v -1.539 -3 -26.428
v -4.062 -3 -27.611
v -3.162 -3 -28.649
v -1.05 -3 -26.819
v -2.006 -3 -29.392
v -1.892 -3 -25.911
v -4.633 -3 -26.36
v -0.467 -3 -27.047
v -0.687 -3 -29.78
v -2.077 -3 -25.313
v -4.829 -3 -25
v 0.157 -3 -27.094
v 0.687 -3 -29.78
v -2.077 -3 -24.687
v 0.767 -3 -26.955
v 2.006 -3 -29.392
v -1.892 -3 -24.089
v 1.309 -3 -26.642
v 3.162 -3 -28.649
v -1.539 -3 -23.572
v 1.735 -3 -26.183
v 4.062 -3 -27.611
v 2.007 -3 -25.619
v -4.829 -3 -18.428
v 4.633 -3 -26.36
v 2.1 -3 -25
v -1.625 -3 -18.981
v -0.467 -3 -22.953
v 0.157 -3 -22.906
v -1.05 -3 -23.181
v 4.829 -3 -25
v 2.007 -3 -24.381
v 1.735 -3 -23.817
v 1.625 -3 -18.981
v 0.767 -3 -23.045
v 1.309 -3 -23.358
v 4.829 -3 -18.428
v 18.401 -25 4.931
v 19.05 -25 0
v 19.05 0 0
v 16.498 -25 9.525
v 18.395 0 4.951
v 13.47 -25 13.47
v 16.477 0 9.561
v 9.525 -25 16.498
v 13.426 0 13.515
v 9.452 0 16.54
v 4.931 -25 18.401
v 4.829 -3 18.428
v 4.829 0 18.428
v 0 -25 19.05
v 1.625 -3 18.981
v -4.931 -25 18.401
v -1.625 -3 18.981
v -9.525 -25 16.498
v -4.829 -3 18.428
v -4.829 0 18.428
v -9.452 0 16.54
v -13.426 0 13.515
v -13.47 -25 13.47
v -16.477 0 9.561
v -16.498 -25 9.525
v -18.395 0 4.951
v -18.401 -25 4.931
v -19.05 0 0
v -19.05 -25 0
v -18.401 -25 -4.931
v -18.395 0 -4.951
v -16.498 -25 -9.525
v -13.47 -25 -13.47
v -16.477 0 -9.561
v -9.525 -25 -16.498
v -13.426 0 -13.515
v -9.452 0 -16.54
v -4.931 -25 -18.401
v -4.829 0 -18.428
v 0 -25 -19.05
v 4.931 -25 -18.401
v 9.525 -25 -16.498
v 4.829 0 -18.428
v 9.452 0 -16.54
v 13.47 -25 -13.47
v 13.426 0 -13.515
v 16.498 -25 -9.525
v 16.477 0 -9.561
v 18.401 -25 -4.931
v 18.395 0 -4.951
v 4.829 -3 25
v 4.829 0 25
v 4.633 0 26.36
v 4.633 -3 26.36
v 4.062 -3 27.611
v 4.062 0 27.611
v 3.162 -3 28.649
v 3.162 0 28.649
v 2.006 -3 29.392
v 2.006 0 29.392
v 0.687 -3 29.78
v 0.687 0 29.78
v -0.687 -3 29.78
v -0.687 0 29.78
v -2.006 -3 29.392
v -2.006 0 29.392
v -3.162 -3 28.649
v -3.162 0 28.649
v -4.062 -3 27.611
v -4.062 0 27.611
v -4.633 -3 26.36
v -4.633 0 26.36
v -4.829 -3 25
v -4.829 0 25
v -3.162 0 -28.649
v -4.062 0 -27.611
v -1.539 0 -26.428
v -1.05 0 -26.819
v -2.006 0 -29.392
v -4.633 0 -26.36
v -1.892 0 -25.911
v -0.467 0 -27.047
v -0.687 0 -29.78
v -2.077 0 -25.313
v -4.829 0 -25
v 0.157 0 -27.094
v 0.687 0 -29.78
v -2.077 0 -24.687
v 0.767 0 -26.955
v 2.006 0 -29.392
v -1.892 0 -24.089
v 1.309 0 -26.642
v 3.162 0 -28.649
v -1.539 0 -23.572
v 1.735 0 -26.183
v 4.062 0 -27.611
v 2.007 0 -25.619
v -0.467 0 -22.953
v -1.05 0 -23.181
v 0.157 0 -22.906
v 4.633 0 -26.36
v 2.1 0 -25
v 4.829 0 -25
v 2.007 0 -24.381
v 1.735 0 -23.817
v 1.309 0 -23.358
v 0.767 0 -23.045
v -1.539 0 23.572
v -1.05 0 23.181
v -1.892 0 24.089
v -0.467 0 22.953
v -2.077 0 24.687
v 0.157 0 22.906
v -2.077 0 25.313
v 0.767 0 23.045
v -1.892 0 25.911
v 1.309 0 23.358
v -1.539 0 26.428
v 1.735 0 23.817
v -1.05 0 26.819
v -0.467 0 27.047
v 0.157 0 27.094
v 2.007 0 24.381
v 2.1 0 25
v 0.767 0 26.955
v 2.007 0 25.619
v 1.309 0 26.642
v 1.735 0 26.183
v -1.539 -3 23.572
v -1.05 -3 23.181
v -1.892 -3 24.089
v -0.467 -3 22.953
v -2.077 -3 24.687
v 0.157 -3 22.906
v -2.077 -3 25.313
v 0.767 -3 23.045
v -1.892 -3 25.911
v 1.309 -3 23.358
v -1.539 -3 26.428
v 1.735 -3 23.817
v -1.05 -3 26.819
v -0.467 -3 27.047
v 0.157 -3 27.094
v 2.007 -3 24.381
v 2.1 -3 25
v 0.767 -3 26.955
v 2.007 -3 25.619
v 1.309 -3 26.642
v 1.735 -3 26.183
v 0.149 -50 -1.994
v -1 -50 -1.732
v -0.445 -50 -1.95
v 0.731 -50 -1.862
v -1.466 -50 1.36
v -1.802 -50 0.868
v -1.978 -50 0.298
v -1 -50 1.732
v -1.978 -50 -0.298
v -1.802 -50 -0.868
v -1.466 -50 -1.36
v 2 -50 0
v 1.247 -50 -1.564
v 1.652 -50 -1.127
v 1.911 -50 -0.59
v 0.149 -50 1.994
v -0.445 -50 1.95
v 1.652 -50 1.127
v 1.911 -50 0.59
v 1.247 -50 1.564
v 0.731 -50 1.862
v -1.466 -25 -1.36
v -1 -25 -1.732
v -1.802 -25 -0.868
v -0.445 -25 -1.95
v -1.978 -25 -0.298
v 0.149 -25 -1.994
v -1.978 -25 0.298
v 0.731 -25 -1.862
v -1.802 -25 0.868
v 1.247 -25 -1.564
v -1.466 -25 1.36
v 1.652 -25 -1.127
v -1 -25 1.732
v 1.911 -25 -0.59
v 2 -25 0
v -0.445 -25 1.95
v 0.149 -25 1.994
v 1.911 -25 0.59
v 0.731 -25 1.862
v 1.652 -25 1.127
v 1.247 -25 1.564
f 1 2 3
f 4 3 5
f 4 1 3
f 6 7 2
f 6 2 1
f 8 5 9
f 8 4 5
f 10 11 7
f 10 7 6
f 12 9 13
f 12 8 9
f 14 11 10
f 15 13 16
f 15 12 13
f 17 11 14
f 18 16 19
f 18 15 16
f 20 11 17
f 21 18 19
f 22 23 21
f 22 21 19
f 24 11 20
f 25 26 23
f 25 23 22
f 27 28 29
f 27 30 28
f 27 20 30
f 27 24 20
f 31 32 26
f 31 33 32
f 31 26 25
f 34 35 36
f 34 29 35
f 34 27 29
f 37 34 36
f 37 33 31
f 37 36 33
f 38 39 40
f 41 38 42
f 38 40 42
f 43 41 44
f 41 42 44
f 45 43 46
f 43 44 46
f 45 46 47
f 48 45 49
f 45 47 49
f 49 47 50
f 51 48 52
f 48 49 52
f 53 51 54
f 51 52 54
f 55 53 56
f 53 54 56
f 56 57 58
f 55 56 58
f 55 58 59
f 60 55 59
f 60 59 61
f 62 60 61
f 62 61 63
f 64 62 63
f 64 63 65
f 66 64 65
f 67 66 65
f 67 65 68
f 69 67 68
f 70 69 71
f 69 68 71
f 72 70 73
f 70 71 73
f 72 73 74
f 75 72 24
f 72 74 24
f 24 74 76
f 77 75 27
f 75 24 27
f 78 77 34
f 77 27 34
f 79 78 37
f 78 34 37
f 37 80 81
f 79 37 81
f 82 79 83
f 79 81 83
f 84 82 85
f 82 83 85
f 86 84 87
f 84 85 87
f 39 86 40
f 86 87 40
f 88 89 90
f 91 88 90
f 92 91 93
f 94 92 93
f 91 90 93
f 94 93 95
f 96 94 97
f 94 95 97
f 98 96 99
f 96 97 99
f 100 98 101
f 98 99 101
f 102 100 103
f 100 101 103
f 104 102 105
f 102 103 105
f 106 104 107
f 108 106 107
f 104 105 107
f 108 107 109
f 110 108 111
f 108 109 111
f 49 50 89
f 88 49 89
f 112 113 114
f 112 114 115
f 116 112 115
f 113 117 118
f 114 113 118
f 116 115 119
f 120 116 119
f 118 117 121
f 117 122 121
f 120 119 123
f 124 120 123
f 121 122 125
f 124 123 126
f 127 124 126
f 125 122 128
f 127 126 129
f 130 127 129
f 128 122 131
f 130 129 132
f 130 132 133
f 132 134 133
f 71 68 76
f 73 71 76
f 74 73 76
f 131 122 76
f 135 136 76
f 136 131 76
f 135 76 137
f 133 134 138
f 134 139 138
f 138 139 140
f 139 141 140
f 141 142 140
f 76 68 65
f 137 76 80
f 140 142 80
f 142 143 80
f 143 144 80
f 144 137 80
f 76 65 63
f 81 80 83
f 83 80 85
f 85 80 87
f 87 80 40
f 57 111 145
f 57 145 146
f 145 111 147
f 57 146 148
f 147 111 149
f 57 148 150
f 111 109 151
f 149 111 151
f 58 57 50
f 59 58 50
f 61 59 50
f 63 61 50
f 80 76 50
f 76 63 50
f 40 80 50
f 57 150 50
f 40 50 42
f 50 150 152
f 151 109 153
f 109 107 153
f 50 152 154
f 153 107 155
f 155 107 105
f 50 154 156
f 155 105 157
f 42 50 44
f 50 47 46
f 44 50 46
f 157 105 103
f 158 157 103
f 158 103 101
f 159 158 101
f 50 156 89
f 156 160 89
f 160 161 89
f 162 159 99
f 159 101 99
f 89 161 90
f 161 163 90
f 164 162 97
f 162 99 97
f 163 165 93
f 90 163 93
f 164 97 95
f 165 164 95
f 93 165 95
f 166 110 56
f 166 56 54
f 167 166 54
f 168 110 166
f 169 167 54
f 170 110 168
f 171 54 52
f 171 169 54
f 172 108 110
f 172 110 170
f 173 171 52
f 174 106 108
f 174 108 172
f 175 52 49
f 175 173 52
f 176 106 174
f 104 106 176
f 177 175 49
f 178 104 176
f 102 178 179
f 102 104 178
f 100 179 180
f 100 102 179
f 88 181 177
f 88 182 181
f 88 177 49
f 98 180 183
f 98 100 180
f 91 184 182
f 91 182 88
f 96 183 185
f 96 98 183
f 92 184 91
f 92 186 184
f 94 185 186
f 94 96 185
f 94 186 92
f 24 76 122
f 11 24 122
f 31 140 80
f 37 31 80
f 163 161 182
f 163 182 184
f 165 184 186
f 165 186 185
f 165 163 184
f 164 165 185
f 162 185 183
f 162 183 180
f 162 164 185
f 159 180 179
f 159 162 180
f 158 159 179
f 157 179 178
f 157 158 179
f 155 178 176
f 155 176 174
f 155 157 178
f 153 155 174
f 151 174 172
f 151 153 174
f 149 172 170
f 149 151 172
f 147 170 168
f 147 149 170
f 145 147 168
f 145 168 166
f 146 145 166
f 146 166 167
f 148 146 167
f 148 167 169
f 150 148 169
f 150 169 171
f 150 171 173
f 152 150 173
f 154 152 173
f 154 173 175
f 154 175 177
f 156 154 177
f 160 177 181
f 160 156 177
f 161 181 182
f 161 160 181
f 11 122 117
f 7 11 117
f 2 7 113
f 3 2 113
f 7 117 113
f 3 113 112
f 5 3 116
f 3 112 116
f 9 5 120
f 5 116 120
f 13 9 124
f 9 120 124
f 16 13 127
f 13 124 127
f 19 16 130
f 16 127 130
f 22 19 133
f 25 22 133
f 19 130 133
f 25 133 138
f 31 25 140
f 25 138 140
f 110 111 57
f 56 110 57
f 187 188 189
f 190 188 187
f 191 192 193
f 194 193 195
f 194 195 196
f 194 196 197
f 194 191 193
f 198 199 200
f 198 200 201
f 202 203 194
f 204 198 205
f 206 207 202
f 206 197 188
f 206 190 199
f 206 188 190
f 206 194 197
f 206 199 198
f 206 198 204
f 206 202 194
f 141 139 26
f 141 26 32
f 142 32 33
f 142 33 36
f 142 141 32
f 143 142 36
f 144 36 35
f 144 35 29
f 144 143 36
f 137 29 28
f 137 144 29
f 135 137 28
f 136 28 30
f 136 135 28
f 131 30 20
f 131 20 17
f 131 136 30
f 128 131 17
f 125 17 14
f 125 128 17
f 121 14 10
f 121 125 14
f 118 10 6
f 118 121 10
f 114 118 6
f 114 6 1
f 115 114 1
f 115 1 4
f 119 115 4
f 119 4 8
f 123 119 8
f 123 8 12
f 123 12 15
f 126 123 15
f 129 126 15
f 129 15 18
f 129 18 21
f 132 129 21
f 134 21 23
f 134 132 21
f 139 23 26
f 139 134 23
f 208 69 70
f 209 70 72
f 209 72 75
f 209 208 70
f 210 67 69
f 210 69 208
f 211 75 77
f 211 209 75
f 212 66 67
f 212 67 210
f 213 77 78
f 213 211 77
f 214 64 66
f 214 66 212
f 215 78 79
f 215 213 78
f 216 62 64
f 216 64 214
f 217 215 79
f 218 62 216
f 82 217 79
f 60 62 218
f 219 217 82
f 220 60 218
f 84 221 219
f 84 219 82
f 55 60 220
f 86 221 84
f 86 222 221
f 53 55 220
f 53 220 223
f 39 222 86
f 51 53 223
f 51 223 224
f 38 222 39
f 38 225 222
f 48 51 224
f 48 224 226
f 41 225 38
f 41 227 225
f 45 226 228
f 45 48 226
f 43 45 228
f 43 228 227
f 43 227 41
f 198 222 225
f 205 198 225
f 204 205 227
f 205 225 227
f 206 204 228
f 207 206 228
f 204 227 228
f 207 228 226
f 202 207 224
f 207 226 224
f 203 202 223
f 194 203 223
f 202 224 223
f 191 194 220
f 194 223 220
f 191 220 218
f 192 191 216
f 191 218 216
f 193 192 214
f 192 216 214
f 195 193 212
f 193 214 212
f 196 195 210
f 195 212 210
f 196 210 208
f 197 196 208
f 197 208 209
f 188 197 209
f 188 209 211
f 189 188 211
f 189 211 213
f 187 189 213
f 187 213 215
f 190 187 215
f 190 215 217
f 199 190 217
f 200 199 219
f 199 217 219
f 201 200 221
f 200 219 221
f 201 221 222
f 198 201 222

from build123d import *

# Parameters (mm, degrees)
F1_R     = 19.05
F2_DEPTH = 25
F3_R     = 2.1
F4_DEPTH = 3
F5_R     = 2
F6_DEPTH = 25


with BuildPart() as f2:
    # F1 (on offset) → F2 (new body)
    with BuildSketch(Plane.XZ):
        Circle(F1_R)
    extrude(amount=F2_DEPTH)

    # F3 (on offset) → F4 (join)
    with BuildSketch(Plane.XZ):
        with BuildLine():
            ThreePointArc((4.828854, 25), (0, 29.828854), (-4.828854, 25))
            Line((-4.828854, 25), (-4.828854, 18.427823))
            ThreePointArc((-4.828854, 18.427823), (0, 19.05), (4.828854, 18.427823))
            Line((4.828854, 18.427823), (4.828854, 25))
        make_face()
        with Locations((0, 25)):
            Circle(F3_R, mode=Mode.SUBTRACT)
        with BuildLine():
            ThreePointArc((-4.828854, -25), (0, -29.828854), (4.828854, -25))
            Line((4.828854, -25), (4.828854, -18.427823))
            ThreePointArc((4.828854, -18.427823), (0, -19.05), (-4.828854, -18.427823))
            Line((-4.828854, -18.427823), (-4.828854, -25))
        make_face()
        with Locations((0, -25)):
            Circle(F3_R, mode=Mode.SUBTRACT)
    extrude(amount=F4_DEPTH)

    # F5 (on face) → F6 (join)
    with BuildSketch(Plane.XZ.offset(25)):
        Circle(F5_R)
    extrude(amount=F6_DEPTH)


solid = f2.part
